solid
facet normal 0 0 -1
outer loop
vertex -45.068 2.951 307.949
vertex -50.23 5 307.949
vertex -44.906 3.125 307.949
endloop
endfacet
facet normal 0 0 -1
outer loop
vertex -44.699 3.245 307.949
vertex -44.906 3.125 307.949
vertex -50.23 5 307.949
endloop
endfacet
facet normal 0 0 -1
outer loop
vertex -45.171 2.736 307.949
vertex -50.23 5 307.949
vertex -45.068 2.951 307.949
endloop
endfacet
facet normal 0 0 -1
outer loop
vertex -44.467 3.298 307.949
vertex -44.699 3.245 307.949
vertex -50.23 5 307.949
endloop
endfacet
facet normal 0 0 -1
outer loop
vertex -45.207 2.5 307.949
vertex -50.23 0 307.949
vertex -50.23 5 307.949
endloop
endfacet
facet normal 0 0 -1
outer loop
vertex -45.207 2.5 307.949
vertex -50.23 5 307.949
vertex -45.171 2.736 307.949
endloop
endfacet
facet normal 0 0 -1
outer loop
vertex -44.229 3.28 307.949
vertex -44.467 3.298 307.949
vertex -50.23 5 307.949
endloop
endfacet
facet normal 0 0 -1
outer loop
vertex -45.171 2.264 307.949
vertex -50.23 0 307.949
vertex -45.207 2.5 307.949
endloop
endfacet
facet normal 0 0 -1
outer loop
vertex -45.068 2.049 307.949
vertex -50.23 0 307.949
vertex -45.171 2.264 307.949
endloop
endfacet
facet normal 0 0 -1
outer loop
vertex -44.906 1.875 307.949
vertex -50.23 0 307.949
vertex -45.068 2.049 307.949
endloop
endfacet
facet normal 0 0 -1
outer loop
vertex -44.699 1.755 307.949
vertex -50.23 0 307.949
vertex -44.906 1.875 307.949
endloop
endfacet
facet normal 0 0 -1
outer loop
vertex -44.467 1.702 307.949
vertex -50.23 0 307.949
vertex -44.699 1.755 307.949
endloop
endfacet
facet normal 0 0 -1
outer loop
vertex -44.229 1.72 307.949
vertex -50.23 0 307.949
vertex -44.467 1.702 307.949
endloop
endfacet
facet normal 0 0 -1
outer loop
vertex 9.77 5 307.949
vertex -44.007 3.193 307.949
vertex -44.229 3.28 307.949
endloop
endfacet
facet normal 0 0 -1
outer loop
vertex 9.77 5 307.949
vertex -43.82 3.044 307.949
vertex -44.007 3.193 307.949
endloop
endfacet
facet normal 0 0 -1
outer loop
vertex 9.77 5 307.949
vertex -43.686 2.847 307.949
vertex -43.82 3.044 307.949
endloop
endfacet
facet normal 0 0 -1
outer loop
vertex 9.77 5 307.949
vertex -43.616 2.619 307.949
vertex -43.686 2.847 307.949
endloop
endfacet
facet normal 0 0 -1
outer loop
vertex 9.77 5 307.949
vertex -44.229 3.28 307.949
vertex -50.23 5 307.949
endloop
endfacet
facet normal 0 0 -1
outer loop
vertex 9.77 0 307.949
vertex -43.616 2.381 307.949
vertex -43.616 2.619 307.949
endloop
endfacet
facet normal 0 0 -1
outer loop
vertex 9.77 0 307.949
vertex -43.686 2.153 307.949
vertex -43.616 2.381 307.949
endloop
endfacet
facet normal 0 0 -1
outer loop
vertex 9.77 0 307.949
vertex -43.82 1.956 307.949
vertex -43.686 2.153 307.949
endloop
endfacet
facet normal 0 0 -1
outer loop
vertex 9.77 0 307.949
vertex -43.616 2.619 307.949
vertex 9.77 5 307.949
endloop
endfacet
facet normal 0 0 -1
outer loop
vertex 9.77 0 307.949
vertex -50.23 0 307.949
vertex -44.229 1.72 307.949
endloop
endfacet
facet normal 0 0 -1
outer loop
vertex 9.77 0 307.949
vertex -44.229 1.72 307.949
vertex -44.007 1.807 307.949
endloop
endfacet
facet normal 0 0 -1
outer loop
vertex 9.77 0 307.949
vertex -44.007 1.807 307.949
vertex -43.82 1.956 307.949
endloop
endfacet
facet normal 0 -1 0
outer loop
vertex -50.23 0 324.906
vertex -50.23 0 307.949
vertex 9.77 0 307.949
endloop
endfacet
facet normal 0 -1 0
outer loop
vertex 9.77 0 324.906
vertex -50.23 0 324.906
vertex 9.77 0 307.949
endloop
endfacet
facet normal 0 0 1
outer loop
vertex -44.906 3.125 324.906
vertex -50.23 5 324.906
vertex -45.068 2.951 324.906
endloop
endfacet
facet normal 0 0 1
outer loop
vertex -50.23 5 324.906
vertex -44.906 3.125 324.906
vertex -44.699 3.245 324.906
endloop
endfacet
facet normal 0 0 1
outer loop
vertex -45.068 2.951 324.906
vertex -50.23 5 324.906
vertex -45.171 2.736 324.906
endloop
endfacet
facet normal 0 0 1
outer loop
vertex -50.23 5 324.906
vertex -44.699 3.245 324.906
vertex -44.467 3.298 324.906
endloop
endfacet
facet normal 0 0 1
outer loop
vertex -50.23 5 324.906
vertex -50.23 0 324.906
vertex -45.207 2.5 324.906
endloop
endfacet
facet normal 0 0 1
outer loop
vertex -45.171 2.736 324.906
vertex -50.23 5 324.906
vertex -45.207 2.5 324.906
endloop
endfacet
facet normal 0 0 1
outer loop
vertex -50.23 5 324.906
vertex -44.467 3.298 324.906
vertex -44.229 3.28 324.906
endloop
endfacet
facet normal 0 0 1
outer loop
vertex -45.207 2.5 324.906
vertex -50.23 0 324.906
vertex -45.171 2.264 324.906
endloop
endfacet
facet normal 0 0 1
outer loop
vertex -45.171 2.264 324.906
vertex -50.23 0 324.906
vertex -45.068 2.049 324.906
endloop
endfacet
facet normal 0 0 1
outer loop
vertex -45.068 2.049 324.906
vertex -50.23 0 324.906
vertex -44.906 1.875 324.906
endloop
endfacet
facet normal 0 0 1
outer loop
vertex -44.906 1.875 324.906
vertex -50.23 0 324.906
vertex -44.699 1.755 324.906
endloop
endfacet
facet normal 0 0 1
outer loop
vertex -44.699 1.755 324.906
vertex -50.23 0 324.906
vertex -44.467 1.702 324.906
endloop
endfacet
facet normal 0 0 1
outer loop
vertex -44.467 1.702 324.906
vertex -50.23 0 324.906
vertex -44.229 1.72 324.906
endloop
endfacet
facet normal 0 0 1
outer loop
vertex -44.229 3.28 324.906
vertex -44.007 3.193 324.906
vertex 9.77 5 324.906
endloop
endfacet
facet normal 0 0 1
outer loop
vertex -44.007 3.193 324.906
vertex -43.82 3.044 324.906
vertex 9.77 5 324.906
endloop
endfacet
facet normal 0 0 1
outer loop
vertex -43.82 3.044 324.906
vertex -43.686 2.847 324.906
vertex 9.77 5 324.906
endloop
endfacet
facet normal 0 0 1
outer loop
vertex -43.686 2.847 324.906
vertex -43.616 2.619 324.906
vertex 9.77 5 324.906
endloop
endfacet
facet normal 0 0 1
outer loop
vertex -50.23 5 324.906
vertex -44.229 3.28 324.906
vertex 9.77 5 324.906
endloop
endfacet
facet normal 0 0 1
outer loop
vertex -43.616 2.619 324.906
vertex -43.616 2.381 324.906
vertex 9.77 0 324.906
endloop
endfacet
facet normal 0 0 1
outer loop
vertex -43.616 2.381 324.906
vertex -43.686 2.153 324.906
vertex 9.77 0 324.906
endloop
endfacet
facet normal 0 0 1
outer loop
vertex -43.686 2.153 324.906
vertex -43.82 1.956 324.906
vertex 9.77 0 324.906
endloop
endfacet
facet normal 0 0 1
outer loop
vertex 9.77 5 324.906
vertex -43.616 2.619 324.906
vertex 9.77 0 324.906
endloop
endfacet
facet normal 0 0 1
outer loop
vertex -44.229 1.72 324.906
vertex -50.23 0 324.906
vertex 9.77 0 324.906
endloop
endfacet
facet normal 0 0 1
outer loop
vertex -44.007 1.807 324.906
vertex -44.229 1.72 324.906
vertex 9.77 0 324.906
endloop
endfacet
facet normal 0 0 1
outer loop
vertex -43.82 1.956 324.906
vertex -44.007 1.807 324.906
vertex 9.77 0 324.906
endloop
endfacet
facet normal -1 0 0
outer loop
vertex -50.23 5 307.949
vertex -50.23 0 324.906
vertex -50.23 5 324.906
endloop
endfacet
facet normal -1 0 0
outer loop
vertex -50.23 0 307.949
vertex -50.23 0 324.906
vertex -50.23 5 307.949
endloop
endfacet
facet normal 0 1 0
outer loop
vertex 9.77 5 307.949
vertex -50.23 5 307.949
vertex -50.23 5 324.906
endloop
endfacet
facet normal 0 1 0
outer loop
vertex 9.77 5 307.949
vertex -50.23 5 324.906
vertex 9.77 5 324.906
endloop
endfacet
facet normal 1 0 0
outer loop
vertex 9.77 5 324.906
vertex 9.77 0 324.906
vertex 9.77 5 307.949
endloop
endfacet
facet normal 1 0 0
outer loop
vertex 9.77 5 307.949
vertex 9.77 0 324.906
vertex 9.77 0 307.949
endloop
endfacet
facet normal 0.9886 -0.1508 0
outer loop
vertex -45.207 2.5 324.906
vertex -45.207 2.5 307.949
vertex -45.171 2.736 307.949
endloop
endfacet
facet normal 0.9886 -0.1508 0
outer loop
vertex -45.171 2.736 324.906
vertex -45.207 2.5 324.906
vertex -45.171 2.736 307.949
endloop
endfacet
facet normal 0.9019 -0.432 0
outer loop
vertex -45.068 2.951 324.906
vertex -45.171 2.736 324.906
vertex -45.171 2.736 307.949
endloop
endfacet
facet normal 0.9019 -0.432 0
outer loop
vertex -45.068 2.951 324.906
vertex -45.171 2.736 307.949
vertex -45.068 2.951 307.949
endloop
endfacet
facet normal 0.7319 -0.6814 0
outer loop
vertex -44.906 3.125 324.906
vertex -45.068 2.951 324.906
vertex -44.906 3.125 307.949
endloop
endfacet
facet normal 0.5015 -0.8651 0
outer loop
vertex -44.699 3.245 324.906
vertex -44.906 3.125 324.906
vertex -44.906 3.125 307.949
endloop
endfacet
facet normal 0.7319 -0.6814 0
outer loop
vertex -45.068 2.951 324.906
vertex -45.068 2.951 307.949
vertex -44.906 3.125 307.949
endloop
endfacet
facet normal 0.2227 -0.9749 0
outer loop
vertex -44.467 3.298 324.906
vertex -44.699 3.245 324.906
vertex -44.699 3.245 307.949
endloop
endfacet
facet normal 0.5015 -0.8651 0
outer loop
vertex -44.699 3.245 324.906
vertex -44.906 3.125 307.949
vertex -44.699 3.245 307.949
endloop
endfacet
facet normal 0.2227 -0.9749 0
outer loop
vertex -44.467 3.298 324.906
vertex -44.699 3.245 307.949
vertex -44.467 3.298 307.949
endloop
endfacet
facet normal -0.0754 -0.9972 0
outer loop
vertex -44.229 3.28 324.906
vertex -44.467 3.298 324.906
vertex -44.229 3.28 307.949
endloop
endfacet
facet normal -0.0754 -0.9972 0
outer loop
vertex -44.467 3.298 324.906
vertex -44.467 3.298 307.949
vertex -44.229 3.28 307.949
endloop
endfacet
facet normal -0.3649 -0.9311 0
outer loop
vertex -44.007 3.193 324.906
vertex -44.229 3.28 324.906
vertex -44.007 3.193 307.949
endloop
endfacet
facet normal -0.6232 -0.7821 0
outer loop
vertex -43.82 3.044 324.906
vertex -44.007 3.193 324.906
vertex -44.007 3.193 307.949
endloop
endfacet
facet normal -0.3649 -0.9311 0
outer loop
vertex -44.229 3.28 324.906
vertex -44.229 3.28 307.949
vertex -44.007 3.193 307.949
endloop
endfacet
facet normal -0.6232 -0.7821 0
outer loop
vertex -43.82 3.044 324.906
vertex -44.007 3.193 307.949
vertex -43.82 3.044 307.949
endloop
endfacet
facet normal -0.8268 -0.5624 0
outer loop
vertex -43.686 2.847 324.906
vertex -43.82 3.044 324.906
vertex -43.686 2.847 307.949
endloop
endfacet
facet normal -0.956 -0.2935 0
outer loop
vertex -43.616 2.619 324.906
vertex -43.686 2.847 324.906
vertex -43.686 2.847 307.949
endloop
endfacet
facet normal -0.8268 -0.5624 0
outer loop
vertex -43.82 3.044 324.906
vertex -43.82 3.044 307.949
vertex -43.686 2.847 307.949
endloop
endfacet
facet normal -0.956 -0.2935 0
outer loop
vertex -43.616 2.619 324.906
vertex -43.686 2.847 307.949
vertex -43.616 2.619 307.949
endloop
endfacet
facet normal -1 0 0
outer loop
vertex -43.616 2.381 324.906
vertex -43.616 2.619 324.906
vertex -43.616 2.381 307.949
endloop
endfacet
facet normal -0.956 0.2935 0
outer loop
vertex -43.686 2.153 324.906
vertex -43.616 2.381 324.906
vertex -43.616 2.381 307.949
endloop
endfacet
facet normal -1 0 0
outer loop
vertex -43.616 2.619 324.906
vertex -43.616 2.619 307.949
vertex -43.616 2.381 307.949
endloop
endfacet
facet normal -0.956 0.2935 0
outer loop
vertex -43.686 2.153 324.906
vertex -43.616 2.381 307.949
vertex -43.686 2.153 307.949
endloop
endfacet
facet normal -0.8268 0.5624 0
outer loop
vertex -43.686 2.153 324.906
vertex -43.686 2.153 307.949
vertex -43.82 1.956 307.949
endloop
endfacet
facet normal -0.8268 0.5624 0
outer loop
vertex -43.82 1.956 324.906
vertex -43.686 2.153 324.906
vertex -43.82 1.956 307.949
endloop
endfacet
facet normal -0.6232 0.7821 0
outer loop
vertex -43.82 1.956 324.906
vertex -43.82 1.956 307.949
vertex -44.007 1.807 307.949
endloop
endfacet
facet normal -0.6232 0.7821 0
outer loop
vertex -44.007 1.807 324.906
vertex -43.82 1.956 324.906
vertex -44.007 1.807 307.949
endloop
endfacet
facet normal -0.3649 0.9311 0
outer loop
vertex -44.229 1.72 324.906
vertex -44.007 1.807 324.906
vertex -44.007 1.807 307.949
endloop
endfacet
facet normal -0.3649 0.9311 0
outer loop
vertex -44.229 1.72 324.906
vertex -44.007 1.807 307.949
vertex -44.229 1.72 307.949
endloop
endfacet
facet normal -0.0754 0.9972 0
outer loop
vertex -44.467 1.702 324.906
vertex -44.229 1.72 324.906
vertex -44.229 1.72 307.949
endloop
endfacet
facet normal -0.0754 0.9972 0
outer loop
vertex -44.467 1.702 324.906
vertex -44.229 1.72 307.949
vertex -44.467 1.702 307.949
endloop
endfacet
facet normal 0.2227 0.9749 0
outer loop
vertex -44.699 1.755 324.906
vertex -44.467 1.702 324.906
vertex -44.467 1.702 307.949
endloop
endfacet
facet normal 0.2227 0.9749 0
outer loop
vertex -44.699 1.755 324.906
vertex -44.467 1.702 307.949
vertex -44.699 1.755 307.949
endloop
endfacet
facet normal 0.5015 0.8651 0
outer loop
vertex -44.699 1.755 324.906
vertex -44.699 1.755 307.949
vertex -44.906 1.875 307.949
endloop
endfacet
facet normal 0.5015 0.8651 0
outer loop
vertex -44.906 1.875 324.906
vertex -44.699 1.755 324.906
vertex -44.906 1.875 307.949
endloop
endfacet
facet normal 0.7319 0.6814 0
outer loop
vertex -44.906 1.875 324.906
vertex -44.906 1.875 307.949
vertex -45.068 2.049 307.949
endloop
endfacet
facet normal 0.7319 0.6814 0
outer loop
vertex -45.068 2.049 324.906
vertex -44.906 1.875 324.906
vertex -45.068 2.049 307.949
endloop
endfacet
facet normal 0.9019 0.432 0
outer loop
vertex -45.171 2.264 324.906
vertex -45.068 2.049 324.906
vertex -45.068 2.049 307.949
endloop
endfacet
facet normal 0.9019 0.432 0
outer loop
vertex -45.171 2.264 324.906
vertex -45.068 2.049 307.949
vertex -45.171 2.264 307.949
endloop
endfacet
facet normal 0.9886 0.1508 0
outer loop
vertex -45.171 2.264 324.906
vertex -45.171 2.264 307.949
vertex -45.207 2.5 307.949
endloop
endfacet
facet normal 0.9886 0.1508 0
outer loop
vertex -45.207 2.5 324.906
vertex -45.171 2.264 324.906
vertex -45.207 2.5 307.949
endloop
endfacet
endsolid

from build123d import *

# Parameters (mm, degrees)
SKETCH1_W                   = 60
SKETCH1_H                   = 16.957284299
BOSS_EXTRUDE1_DEPTH         = 5
TAP_DRILL_FOR_M2X0_4_TAP1_D = 1.6


with BuildPart() as part:
    # Sketch1 → Boss-Extrude1 (new body)
    with BuildSketch(Plane(origin=(0, 0, 0), x_dir=(1, 0, 0), z_dir=(0, 1, 0))):
        with Locations((-20.230276441, -316.427173265)):
            Rectangle(SKETCH1_W, SKETCH1_H)
    extrude(amount=BOSS_EXTRUDE1_DEPTH)

    # Tap Drill for M2x0.4 Tap1 (through all)
    with Locations(Plane.XY.offset(324.905815414)):
        with Locations((-44.406835203, 2.5)):
            Hole(TAP_DRILL_FOR_M2X0_4_TAP1_D / 2)


solid = part.part
